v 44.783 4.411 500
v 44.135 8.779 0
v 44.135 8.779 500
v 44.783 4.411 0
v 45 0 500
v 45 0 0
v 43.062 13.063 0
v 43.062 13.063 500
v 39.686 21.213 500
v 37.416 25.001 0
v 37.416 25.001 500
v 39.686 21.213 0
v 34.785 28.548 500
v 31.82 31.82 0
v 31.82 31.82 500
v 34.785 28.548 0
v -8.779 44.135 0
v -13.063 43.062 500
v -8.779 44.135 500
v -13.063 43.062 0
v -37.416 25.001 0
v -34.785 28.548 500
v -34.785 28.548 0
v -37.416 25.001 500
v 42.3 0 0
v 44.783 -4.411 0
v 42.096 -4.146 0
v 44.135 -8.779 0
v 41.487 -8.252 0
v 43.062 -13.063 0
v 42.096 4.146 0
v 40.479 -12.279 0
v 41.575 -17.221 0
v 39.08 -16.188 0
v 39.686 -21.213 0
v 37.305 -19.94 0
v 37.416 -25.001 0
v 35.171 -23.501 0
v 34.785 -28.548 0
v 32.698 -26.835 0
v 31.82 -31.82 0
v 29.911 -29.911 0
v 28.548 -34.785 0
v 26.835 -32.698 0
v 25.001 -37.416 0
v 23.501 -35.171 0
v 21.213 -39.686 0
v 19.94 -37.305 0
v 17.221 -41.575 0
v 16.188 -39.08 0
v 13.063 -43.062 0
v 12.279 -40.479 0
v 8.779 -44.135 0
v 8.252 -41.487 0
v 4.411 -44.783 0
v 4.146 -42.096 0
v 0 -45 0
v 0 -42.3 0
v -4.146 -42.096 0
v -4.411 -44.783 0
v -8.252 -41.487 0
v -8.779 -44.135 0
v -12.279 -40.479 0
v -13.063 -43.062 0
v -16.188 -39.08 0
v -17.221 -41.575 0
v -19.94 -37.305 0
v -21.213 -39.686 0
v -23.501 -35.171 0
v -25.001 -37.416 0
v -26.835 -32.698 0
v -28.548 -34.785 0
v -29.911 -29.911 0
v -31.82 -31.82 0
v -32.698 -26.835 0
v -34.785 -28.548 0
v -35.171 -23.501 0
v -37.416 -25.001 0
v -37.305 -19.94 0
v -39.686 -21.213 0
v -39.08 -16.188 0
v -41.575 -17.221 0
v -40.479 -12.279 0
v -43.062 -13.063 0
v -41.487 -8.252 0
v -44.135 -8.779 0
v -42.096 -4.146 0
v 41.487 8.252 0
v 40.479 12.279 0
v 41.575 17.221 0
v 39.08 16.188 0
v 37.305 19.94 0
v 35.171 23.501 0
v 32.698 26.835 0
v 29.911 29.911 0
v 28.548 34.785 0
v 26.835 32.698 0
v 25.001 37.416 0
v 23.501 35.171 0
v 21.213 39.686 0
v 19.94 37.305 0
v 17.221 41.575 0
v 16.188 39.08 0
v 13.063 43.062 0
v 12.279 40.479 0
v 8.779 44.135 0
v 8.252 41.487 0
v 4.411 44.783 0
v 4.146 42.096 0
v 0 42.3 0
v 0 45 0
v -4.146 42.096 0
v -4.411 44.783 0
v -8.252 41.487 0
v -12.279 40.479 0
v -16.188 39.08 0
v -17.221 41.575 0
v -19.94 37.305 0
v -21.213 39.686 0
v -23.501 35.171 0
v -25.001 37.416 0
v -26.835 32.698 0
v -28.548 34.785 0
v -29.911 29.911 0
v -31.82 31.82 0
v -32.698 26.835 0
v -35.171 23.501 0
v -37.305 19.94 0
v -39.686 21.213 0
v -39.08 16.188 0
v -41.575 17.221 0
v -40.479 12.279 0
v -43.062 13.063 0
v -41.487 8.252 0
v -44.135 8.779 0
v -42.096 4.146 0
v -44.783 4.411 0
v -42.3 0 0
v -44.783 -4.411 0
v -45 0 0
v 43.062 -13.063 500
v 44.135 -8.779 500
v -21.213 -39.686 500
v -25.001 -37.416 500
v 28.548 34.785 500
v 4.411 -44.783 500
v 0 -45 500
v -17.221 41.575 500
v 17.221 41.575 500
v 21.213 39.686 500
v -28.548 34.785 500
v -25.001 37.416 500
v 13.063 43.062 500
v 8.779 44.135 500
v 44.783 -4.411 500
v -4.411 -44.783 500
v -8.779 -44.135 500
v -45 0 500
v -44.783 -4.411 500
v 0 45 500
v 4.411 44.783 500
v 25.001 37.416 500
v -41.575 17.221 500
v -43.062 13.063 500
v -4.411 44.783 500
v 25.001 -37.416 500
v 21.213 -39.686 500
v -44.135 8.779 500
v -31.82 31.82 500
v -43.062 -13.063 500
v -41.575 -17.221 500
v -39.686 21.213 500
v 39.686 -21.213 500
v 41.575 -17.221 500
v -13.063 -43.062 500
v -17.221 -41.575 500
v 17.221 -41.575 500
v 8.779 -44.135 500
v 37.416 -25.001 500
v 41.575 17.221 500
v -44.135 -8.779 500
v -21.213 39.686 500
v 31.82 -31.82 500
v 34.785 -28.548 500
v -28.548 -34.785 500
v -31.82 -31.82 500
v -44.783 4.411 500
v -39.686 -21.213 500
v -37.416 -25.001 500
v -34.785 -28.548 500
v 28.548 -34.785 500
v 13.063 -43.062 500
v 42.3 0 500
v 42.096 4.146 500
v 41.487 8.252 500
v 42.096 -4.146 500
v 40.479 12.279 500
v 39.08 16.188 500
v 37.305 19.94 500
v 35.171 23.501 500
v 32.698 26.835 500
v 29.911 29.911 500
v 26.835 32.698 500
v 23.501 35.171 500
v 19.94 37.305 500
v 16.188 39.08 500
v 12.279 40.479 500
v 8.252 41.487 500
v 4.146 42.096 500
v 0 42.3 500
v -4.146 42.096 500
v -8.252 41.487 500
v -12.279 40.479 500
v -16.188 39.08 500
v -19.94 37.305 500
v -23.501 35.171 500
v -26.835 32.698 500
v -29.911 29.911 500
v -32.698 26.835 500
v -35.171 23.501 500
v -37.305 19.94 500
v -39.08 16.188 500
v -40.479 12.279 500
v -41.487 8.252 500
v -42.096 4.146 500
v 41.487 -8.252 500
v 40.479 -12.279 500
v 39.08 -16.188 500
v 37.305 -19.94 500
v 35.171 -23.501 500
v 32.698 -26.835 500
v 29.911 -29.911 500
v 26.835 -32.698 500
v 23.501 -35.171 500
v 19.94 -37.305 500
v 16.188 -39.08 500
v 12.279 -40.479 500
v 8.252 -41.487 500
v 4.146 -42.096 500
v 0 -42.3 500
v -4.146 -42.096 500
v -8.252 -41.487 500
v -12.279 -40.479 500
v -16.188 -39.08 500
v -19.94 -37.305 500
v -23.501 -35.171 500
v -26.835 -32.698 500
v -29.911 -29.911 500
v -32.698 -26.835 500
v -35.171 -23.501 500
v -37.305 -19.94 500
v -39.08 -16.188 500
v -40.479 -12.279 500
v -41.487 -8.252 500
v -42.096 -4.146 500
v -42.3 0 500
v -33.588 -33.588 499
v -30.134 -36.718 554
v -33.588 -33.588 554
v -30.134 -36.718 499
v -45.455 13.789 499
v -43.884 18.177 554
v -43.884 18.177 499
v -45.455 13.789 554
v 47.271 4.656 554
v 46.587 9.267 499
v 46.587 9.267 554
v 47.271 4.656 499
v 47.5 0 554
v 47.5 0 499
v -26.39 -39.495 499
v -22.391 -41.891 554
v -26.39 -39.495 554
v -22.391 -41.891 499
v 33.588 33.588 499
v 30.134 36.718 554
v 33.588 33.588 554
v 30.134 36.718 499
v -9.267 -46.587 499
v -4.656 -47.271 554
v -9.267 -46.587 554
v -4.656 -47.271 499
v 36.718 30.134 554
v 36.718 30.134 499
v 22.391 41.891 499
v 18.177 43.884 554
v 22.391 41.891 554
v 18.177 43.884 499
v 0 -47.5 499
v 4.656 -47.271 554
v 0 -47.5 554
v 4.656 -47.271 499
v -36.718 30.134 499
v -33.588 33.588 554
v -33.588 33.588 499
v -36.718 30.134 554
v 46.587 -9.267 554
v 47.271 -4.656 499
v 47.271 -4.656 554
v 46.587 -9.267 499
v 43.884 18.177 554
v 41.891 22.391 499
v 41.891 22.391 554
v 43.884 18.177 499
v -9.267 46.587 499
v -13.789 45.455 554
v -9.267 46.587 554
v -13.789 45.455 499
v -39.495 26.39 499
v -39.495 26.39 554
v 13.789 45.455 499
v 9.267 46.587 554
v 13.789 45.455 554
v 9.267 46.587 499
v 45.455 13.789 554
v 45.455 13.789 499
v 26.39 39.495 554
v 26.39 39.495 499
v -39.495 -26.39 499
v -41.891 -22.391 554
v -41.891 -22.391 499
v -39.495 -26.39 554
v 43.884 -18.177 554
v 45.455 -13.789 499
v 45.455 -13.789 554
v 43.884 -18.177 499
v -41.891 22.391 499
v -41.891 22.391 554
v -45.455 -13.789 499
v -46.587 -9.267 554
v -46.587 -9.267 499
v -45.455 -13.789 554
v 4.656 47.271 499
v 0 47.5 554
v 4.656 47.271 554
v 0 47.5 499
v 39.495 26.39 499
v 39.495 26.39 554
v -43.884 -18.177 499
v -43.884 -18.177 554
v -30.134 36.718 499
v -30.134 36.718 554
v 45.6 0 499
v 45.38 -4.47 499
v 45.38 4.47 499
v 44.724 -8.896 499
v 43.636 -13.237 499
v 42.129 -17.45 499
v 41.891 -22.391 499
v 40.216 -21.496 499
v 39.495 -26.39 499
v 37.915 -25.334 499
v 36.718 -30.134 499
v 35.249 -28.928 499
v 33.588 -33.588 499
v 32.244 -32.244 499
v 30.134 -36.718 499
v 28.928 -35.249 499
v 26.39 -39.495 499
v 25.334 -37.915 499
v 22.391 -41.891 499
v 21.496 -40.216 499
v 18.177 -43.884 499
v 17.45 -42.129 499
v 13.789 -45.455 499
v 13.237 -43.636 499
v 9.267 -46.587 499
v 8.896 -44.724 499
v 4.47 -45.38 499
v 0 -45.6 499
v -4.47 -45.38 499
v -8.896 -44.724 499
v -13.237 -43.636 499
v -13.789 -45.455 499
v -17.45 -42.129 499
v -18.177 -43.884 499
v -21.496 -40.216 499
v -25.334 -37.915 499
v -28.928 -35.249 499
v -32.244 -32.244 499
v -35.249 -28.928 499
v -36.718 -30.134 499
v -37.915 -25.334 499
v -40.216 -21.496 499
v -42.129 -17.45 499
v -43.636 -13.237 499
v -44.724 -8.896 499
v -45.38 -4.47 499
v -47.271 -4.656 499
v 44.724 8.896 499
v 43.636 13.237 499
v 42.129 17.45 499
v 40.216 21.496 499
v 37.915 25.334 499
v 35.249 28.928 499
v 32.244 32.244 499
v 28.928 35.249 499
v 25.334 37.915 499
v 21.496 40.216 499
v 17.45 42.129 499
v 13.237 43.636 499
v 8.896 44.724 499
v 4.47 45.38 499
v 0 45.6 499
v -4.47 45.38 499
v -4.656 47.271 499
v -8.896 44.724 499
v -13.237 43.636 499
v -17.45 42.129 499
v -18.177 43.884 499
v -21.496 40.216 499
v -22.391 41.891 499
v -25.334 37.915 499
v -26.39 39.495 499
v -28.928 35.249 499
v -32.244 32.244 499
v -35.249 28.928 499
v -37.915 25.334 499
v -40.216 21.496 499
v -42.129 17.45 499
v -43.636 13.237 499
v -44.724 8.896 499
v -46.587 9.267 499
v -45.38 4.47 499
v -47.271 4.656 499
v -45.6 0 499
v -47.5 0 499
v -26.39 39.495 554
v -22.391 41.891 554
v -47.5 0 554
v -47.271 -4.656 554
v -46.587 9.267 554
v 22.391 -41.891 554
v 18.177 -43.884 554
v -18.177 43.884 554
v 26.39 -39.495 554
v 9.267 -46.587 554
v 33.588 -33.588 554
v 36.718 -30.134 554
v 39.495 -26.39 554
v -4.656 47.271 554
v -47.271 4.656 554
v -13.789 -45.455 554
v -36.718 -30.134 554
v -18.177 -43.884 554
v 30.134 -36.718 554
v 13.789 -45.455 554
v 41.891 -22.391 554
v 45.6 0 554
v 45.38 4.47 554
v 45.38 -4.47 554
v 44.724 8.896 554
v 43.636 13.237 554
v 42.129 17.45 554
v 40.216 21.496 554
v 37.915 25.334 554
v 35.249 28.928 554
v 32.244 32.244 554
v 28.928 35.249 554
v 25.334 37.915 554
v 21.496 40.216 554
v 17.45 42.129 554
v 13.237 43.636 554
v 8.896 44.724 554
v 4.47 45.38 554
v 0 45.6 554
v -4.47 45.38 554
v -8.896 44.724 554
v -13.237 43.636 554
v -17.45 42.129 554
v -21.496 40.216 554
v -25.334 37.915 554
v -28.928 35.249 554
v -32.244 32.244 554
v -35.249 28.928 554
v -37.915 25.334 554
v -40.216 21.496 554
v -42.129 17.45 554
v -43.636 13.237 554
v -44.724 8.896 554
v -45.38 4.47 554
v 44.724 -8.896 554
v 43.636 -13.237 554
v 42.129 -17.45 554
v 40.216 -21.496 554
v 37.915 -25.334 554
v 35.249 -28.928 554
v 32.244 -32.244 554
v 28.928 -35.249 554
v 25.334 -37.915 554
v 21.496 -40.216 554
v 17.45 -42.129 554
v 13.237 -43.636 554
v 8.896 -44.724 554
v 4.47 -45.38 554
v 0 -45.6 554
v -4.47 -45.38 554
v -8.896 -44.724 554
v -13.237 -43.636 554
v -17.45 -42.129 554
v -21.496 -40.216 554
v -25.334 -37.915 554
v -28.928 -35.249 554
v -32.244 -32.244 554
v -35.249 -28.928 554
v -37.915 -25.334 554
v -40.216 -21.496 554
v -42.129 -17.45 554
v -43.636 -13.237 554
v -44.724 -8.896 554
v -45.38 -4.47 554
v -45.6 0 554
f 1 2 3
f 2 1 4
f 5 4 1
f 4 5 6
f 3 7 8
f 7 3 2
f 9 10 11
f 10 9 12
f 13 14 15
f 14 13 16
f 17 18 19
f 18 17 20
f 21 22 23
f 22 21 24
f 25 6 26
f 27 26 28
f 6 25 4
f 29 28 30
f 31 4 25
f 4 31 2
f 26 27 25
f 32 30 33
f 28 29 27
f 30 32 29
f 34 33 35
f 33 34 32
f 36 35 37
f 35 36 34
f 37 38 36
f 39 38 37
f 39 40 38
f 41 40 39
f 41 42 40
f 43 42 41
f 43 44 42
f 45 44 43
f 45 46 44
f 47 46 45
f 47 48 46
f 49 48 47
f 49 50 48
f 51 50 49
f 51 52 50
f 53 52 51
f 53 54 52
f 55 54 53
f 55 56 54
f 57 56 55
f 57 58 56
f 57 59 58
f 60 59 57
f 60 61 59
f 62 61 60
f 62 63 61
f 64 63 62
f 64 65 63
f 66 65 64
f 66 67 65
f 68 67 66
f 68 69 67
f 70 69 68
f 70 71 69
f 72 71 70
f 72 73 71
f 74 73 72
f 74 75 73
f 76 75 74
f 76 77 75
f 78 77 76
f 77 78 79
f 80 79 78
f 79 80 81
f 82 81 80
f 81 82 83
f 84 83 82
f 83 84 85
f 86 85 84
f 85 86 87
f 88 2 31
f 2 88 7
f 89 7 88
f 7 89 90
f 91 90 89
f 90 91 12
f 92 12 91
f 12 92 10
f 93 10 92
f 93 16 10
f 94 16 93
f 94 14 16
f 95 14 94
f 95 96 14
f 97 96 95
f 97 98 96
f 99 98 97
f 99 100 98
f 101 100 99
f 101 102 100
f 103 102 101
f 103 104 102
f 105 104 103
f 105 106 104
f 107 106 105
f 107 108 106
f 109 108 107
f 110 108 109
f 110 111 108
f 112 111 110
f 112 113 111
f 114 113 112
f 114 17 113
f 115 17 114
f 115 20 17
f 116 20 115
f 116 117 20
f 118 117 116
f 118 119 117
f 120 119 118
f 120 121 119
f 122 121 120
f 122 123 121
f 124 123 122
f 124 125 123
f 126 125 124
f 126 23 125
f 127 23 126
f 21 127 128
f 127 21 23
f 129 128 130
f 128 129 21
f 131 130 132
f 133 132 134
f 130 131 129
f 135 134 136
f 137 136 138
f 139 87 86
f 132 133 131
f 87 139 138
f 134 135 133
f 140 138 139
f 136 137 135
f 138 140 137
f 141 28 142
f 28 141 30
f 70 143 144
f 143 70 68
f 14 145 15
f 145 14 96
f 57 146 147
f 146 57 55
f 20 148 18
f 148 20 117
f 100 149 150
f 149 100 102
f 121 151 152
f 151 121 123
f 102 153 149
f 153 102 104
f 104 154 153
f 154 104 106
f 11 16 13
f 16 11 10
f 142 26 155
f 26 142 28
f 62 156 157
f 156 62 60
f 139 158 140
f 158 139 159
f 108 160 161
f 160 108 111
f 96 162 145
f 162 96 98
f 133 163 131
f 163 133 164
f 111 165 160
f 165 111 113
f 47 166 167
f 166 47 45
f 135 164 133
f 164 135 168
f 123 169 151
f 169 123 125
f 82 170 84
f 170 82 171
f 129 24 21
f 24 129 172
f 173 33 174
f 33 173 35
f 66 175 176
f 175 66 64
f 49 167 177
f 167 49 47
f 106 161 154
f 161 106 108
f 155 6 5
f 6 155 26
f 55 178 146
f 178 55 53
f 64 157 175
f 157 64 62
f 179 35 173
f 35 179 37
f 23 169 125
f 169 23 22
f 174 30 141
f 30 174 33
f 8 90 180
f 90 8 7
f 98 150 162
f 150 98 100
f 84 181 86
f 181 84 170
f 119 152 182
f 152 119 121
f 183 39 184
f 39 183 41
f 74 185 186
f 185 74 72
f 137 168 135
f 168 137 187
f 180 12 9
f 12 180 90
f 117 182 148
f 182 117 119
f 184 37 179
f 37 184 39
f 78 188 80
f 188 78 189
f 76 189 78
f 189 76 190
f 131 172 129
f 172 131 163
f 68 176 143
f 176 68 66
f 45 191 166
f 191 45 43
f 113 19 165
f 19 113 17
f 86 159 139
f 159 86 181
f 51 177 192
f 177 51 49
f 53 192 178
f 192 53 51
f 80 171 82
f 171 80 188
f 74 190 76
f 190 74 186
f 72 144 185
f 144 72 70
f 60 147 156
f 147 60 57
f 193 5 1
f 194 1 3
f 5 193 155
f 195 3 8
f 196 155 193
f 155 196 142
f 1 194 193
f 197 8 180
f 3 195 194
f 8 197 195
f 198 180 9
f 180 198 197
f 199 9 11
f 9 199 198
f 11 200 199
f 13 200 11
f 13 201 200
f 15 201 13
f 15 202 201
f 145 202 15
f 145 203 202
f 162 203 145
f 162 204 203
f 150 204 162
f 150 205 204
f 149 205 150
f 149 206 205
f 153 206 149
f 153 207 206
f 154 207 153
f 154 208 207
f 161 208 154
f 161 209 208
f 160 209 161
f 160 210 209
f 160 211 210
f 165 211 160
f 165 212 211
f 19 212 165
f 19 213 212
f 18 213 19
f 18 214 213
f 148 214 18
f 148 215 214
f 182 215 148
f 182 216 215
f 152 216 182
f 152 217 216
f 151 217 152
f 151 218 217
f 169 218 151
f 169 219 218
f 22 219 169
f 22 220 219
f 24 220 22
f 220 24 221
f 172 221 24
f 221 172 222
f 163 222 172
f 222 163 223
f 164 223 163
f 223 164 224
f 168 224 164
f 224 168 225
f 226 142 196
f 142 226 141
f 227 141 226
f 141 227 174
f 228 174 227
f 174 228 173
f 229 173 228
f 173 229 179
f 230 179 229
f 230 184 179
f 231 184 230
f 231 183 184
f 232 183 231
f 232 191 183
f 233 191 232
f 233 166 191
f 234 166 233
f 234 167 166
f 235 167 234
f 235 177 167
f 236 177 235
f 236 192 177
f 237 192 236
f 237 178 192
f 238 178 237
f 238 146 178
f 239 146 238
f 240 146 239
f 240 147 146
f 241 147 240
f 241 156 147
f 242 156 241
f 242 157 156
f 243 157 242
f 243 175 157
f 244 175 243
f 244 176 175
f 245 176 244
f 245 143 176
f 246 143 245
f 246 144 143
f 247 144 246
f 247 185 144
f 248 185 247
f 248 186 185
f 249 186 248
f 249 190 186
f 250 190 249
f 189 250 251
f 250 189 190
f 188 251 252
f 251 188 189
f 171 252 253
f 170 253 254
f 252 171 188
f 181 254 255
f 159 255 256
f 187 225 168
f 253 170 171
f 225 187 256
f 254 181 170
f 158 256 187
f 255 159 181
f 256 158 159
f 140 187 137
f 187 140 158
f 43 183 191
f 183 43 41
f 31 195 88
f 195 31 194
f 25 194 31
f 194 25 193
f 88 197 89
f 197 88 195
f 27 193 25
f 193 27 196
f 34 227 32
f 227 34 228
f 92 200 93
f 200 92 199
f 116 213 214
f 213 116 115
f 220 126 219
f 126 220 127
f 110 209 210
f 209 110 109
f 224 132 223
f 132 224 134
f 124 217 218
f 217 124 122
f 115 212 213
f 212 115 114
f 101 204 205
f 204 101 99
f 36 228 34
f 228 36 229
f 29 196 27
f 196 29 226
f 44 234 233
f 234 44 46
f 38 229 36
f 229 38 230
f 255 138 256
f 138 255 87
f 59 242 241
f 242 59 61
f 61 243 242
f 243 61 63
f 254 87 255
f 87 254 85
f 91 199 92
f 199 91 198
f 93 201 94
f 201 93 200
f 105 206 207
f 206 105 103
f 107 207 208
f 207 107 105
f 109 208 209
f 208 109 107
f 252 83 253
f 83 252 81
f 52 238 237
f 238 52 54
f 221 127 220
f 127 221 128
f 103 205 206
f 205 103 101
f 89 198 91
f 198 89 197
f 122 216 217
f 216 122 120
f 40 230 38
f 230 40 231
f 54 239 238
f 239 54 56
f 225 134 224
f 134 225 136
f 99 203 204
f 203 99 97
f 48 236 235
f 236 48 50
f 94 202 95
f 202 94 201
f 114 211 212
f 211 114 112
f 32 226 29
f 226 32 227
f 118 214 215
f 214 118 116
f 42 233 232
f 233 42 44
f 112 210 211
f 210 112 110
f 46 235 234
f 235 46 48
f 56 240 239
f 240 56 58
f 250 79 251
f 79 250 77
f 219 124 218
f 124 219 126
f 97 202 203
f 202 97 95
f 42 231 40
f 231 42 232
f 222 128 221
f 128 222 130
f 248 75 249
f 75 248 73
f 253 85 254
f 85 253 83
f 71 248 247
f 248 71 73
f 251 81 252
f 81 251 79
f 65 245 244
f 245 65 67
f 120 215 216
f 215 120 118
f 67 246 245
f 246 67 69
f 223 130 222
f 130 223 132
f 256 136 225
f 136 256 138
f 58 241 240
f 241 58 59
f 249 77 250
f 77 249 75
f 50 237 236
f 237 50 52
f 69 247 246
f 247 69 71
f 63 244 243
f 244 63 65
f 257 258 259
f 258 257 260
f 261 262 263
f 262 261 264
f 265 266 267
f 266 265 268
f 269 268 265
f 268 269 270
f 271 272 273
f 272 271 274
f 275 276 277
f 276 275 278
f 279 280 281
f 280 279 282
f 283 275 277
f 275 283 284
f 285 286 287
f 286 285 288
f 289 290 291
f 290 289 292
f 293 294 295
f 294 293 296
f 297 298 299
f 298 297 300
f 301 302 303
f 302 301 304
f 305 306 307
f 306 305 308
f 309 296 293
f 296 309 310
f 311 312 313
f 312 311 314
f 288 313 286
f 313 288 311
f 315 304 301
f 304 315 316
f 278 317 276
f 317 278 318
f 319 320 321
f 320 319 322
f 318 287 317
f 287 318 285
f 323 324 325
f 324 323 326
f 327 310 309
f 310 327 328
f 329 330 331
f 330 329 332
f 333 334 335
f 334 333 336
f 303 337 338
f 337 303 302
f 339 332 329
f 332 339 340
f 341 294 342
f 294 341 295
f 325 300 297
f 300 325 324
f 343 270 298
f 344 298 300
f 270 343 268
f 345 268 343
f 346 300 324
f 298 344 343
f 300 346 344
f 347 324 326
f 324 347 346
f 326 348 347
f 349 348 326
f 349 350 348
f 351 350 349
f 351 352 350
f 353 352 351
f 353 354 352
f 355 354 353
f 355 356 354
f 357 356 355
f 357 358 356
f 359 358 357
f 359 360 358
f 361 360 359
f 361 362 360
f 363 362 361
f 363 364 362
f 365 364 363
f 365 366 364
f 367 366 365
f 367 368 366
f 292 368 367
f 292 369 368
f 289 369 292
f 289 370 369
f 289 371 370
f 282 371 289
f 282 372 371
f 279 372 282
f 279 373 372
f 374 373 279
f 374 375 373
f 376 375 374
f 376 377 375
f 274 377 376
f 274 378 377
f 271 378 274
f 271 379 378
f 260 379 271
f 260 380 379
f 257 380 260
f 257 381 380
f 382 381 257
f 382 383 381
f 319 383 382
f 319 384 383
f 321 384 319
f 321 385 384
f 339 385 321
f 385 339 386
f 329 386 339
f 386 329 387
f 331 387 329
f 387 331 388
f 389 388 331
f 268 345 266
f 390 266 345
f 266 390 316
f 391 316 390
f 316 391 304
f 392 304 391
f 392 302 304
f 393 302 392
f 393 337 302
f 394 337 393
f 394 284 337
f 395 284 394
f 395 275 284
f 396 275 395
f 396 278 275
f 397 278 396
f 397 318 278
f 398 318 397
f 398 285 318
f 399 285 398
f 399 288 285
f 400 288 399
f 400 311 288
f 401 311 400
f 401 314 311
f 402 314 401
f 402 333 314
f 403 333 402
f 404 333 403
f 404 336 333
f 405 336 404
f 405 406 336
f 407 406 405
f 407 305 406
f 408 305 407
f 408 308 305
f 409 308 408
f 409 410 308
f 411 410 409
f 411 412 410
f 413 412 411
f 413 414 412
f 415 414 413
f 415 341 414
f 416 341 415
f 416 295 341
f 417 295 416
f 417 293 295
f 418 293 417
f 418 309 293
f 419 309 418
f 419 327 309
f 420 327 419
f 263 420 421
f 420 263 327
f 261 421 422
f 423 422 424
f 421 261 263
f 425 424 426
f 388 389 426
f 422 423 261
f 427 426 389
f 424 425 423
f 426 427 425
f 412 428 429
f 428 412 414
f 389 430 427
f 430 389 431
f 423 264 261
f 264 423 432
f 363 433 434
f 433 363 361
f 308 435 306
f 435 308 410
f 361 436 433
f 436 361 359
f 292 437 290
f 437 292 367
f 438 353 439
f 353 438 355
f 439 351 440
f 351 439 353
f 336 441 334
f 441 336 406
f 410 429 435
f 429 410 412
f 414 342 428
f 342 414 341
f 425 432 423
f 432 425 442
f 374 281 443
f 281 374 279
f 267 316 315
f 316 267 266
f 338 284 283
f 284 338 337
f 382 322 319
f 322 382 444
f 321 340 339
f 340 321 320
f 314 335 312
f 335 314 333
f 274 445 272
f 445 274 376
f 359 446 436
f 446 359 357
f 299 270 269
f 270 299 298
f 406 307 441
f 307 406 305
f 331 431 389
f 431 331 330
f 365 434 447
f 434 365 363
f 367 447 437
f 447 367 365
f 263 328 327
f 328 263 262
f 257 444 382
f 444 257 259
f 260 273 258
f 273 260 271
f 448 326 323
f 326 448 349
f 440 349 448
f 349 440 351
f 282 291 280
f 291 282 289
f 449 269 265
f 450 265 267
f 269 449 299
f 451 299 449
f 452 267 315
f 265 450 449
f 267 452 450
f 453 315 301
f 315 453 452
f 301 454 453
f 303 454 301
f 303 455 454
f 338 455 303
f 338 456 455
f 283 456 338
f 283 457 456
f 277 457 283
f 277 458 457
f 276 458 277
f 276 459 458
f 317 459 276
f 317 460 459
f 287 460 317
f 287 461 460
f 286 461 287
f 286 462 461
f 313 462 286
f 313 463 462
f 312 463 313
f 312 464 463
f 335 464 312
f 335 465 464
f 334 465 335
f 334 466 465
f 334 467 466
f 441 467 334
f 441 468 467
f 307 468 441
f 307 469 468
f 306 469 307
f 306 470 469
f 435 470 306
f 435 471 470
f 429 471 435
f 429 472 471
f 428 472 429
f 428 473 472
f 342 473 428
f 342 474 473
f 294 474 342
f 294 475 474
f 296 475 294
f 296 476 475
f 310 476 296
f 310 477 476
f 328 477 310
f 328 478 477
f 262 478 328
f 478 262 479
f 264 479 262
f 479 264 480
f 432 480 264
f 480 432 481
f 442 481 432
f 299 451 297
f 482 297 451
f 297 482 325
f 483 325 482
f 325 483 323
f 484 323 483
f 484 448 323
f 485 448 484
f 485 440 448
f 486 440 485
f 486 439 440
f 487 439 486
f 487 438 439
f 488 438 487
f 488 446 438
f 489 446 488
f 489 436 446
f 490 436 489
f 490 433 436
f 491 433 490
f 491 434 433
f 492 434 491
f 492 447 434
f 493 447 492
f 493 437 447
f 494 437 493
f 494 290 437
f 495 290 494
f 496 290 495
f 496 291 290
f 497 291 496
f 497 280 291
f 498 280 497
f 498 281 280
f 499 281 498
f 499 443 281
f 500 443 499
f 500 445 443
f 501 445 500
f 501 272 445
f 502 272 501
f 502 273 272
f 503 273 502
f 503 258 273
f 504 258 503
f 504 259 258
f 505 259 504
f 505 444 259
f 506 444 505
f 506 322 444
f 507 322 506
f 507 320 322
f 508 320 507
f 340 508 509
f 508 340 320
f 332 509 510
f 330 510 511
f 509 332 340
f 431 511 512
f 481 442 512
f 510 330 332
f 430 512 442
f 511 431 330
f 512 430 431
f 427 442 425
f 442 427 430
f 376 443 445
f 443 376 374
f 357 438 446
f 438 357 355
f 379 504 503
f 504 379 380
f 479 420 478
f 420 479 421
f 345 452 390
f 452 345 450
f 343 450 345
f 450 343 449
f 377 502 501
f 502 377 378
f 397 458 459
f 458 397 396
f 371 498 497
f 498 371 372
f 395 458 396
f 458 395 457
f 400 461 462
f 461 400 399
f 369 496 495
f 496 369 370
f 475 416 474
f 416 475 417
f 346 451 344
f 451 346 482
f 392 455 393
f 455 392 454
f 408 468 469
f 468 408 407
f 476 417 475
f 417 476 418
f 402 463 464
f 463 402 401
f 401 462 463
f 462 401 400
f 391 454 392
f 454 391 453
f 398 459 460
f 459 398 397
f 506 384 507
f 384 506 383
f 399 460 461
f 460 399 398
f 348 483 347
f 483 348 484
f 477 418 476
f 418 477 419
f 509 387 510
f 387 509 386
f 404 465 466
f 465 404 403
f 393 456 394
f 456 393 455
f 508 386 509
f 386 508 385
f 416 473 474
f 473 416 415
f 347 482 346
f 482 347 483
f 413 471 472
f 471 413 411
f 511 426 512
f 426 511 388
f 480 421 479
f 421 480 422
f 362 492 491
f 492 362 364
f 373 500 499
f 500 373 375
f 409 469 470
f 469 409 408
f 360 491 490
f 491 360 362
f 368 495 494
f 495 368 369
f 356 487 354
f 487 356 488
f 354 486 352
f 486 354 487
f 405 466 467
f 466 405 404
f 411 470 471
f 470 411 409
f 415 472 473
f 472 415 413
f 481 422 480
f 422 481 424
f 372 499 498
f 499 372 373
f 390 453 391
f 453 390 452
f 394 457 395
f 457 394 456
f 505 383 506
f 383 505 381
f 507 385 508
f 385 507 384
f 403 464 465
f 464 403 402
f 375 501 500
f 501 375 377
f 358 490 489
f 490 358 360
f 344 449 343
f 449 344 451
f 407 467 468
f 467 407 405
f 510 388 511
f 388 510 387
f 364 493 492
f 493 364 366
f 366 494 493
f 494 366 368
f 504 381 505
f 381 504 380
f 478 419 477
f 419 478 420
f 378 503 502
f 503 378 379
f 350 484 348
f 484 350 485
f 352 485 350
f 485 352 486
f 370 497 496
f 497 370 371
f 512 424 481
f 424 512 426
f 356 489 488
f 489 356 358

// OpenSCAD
// Parameters
nominal_diameter_mm = 90; //[50:160:1]
length_mm = 500; //[250:1000:1]
outer_diameter_mm = 90; //[50:160:0.5]
wall_thickness_mm = 2.7; //[1.5:6:0.1]
inner_diameter_mm = 84.6; //[40:155:0.5]
include_end_fitting = 1; //[0:1:1]
fitting_length_mm = 55; //[30:120:1]
fitting_wall_extra_mm = 2.5; //[1:8:0.1]
socket_clearance_mm = 0.6; //[0.2:1.5:0.1]
overlap_mm = 1; //[0.5:2:0.1]

// HT Pipe - complete geometry
module ht_pipe() {
  color([0.85, 0.85, 0.8]) {
    // Pipe body
    difference() {
      translate([0, 0, 0])
        cylinder(h=length_mm, r=outer_diameter_mm/2, center=false, $fn=64);
      translate([0, 0, -overlap_mm])
        cylinder(h=length_mm + 2*overlap_mm, r=inner_diameter_mm/2, center=false, $fn=64);
    }
    
    // End fitting (socket)
    if (include_end_fitting) {
      difference() {
        translate([0, 0, length_mm - overlap_mm])
          cylinder(h=fitting_length_mm, r=outer_diameter_mm/2 + fitting_wall_extra_mm, center=false, $fn=64);
        translate([0, 0, length_mm - 2*overlap_mm])
          cylinder(h=fitting_length_mm + 2*overlap_mm, r=outer_diameter_mm/2 + socket_clearance_mm, center=false, $fn=64);
      }
    }
  }
}

// Assembly
module assembly() {
  ht_pipe();
}

assembly();
